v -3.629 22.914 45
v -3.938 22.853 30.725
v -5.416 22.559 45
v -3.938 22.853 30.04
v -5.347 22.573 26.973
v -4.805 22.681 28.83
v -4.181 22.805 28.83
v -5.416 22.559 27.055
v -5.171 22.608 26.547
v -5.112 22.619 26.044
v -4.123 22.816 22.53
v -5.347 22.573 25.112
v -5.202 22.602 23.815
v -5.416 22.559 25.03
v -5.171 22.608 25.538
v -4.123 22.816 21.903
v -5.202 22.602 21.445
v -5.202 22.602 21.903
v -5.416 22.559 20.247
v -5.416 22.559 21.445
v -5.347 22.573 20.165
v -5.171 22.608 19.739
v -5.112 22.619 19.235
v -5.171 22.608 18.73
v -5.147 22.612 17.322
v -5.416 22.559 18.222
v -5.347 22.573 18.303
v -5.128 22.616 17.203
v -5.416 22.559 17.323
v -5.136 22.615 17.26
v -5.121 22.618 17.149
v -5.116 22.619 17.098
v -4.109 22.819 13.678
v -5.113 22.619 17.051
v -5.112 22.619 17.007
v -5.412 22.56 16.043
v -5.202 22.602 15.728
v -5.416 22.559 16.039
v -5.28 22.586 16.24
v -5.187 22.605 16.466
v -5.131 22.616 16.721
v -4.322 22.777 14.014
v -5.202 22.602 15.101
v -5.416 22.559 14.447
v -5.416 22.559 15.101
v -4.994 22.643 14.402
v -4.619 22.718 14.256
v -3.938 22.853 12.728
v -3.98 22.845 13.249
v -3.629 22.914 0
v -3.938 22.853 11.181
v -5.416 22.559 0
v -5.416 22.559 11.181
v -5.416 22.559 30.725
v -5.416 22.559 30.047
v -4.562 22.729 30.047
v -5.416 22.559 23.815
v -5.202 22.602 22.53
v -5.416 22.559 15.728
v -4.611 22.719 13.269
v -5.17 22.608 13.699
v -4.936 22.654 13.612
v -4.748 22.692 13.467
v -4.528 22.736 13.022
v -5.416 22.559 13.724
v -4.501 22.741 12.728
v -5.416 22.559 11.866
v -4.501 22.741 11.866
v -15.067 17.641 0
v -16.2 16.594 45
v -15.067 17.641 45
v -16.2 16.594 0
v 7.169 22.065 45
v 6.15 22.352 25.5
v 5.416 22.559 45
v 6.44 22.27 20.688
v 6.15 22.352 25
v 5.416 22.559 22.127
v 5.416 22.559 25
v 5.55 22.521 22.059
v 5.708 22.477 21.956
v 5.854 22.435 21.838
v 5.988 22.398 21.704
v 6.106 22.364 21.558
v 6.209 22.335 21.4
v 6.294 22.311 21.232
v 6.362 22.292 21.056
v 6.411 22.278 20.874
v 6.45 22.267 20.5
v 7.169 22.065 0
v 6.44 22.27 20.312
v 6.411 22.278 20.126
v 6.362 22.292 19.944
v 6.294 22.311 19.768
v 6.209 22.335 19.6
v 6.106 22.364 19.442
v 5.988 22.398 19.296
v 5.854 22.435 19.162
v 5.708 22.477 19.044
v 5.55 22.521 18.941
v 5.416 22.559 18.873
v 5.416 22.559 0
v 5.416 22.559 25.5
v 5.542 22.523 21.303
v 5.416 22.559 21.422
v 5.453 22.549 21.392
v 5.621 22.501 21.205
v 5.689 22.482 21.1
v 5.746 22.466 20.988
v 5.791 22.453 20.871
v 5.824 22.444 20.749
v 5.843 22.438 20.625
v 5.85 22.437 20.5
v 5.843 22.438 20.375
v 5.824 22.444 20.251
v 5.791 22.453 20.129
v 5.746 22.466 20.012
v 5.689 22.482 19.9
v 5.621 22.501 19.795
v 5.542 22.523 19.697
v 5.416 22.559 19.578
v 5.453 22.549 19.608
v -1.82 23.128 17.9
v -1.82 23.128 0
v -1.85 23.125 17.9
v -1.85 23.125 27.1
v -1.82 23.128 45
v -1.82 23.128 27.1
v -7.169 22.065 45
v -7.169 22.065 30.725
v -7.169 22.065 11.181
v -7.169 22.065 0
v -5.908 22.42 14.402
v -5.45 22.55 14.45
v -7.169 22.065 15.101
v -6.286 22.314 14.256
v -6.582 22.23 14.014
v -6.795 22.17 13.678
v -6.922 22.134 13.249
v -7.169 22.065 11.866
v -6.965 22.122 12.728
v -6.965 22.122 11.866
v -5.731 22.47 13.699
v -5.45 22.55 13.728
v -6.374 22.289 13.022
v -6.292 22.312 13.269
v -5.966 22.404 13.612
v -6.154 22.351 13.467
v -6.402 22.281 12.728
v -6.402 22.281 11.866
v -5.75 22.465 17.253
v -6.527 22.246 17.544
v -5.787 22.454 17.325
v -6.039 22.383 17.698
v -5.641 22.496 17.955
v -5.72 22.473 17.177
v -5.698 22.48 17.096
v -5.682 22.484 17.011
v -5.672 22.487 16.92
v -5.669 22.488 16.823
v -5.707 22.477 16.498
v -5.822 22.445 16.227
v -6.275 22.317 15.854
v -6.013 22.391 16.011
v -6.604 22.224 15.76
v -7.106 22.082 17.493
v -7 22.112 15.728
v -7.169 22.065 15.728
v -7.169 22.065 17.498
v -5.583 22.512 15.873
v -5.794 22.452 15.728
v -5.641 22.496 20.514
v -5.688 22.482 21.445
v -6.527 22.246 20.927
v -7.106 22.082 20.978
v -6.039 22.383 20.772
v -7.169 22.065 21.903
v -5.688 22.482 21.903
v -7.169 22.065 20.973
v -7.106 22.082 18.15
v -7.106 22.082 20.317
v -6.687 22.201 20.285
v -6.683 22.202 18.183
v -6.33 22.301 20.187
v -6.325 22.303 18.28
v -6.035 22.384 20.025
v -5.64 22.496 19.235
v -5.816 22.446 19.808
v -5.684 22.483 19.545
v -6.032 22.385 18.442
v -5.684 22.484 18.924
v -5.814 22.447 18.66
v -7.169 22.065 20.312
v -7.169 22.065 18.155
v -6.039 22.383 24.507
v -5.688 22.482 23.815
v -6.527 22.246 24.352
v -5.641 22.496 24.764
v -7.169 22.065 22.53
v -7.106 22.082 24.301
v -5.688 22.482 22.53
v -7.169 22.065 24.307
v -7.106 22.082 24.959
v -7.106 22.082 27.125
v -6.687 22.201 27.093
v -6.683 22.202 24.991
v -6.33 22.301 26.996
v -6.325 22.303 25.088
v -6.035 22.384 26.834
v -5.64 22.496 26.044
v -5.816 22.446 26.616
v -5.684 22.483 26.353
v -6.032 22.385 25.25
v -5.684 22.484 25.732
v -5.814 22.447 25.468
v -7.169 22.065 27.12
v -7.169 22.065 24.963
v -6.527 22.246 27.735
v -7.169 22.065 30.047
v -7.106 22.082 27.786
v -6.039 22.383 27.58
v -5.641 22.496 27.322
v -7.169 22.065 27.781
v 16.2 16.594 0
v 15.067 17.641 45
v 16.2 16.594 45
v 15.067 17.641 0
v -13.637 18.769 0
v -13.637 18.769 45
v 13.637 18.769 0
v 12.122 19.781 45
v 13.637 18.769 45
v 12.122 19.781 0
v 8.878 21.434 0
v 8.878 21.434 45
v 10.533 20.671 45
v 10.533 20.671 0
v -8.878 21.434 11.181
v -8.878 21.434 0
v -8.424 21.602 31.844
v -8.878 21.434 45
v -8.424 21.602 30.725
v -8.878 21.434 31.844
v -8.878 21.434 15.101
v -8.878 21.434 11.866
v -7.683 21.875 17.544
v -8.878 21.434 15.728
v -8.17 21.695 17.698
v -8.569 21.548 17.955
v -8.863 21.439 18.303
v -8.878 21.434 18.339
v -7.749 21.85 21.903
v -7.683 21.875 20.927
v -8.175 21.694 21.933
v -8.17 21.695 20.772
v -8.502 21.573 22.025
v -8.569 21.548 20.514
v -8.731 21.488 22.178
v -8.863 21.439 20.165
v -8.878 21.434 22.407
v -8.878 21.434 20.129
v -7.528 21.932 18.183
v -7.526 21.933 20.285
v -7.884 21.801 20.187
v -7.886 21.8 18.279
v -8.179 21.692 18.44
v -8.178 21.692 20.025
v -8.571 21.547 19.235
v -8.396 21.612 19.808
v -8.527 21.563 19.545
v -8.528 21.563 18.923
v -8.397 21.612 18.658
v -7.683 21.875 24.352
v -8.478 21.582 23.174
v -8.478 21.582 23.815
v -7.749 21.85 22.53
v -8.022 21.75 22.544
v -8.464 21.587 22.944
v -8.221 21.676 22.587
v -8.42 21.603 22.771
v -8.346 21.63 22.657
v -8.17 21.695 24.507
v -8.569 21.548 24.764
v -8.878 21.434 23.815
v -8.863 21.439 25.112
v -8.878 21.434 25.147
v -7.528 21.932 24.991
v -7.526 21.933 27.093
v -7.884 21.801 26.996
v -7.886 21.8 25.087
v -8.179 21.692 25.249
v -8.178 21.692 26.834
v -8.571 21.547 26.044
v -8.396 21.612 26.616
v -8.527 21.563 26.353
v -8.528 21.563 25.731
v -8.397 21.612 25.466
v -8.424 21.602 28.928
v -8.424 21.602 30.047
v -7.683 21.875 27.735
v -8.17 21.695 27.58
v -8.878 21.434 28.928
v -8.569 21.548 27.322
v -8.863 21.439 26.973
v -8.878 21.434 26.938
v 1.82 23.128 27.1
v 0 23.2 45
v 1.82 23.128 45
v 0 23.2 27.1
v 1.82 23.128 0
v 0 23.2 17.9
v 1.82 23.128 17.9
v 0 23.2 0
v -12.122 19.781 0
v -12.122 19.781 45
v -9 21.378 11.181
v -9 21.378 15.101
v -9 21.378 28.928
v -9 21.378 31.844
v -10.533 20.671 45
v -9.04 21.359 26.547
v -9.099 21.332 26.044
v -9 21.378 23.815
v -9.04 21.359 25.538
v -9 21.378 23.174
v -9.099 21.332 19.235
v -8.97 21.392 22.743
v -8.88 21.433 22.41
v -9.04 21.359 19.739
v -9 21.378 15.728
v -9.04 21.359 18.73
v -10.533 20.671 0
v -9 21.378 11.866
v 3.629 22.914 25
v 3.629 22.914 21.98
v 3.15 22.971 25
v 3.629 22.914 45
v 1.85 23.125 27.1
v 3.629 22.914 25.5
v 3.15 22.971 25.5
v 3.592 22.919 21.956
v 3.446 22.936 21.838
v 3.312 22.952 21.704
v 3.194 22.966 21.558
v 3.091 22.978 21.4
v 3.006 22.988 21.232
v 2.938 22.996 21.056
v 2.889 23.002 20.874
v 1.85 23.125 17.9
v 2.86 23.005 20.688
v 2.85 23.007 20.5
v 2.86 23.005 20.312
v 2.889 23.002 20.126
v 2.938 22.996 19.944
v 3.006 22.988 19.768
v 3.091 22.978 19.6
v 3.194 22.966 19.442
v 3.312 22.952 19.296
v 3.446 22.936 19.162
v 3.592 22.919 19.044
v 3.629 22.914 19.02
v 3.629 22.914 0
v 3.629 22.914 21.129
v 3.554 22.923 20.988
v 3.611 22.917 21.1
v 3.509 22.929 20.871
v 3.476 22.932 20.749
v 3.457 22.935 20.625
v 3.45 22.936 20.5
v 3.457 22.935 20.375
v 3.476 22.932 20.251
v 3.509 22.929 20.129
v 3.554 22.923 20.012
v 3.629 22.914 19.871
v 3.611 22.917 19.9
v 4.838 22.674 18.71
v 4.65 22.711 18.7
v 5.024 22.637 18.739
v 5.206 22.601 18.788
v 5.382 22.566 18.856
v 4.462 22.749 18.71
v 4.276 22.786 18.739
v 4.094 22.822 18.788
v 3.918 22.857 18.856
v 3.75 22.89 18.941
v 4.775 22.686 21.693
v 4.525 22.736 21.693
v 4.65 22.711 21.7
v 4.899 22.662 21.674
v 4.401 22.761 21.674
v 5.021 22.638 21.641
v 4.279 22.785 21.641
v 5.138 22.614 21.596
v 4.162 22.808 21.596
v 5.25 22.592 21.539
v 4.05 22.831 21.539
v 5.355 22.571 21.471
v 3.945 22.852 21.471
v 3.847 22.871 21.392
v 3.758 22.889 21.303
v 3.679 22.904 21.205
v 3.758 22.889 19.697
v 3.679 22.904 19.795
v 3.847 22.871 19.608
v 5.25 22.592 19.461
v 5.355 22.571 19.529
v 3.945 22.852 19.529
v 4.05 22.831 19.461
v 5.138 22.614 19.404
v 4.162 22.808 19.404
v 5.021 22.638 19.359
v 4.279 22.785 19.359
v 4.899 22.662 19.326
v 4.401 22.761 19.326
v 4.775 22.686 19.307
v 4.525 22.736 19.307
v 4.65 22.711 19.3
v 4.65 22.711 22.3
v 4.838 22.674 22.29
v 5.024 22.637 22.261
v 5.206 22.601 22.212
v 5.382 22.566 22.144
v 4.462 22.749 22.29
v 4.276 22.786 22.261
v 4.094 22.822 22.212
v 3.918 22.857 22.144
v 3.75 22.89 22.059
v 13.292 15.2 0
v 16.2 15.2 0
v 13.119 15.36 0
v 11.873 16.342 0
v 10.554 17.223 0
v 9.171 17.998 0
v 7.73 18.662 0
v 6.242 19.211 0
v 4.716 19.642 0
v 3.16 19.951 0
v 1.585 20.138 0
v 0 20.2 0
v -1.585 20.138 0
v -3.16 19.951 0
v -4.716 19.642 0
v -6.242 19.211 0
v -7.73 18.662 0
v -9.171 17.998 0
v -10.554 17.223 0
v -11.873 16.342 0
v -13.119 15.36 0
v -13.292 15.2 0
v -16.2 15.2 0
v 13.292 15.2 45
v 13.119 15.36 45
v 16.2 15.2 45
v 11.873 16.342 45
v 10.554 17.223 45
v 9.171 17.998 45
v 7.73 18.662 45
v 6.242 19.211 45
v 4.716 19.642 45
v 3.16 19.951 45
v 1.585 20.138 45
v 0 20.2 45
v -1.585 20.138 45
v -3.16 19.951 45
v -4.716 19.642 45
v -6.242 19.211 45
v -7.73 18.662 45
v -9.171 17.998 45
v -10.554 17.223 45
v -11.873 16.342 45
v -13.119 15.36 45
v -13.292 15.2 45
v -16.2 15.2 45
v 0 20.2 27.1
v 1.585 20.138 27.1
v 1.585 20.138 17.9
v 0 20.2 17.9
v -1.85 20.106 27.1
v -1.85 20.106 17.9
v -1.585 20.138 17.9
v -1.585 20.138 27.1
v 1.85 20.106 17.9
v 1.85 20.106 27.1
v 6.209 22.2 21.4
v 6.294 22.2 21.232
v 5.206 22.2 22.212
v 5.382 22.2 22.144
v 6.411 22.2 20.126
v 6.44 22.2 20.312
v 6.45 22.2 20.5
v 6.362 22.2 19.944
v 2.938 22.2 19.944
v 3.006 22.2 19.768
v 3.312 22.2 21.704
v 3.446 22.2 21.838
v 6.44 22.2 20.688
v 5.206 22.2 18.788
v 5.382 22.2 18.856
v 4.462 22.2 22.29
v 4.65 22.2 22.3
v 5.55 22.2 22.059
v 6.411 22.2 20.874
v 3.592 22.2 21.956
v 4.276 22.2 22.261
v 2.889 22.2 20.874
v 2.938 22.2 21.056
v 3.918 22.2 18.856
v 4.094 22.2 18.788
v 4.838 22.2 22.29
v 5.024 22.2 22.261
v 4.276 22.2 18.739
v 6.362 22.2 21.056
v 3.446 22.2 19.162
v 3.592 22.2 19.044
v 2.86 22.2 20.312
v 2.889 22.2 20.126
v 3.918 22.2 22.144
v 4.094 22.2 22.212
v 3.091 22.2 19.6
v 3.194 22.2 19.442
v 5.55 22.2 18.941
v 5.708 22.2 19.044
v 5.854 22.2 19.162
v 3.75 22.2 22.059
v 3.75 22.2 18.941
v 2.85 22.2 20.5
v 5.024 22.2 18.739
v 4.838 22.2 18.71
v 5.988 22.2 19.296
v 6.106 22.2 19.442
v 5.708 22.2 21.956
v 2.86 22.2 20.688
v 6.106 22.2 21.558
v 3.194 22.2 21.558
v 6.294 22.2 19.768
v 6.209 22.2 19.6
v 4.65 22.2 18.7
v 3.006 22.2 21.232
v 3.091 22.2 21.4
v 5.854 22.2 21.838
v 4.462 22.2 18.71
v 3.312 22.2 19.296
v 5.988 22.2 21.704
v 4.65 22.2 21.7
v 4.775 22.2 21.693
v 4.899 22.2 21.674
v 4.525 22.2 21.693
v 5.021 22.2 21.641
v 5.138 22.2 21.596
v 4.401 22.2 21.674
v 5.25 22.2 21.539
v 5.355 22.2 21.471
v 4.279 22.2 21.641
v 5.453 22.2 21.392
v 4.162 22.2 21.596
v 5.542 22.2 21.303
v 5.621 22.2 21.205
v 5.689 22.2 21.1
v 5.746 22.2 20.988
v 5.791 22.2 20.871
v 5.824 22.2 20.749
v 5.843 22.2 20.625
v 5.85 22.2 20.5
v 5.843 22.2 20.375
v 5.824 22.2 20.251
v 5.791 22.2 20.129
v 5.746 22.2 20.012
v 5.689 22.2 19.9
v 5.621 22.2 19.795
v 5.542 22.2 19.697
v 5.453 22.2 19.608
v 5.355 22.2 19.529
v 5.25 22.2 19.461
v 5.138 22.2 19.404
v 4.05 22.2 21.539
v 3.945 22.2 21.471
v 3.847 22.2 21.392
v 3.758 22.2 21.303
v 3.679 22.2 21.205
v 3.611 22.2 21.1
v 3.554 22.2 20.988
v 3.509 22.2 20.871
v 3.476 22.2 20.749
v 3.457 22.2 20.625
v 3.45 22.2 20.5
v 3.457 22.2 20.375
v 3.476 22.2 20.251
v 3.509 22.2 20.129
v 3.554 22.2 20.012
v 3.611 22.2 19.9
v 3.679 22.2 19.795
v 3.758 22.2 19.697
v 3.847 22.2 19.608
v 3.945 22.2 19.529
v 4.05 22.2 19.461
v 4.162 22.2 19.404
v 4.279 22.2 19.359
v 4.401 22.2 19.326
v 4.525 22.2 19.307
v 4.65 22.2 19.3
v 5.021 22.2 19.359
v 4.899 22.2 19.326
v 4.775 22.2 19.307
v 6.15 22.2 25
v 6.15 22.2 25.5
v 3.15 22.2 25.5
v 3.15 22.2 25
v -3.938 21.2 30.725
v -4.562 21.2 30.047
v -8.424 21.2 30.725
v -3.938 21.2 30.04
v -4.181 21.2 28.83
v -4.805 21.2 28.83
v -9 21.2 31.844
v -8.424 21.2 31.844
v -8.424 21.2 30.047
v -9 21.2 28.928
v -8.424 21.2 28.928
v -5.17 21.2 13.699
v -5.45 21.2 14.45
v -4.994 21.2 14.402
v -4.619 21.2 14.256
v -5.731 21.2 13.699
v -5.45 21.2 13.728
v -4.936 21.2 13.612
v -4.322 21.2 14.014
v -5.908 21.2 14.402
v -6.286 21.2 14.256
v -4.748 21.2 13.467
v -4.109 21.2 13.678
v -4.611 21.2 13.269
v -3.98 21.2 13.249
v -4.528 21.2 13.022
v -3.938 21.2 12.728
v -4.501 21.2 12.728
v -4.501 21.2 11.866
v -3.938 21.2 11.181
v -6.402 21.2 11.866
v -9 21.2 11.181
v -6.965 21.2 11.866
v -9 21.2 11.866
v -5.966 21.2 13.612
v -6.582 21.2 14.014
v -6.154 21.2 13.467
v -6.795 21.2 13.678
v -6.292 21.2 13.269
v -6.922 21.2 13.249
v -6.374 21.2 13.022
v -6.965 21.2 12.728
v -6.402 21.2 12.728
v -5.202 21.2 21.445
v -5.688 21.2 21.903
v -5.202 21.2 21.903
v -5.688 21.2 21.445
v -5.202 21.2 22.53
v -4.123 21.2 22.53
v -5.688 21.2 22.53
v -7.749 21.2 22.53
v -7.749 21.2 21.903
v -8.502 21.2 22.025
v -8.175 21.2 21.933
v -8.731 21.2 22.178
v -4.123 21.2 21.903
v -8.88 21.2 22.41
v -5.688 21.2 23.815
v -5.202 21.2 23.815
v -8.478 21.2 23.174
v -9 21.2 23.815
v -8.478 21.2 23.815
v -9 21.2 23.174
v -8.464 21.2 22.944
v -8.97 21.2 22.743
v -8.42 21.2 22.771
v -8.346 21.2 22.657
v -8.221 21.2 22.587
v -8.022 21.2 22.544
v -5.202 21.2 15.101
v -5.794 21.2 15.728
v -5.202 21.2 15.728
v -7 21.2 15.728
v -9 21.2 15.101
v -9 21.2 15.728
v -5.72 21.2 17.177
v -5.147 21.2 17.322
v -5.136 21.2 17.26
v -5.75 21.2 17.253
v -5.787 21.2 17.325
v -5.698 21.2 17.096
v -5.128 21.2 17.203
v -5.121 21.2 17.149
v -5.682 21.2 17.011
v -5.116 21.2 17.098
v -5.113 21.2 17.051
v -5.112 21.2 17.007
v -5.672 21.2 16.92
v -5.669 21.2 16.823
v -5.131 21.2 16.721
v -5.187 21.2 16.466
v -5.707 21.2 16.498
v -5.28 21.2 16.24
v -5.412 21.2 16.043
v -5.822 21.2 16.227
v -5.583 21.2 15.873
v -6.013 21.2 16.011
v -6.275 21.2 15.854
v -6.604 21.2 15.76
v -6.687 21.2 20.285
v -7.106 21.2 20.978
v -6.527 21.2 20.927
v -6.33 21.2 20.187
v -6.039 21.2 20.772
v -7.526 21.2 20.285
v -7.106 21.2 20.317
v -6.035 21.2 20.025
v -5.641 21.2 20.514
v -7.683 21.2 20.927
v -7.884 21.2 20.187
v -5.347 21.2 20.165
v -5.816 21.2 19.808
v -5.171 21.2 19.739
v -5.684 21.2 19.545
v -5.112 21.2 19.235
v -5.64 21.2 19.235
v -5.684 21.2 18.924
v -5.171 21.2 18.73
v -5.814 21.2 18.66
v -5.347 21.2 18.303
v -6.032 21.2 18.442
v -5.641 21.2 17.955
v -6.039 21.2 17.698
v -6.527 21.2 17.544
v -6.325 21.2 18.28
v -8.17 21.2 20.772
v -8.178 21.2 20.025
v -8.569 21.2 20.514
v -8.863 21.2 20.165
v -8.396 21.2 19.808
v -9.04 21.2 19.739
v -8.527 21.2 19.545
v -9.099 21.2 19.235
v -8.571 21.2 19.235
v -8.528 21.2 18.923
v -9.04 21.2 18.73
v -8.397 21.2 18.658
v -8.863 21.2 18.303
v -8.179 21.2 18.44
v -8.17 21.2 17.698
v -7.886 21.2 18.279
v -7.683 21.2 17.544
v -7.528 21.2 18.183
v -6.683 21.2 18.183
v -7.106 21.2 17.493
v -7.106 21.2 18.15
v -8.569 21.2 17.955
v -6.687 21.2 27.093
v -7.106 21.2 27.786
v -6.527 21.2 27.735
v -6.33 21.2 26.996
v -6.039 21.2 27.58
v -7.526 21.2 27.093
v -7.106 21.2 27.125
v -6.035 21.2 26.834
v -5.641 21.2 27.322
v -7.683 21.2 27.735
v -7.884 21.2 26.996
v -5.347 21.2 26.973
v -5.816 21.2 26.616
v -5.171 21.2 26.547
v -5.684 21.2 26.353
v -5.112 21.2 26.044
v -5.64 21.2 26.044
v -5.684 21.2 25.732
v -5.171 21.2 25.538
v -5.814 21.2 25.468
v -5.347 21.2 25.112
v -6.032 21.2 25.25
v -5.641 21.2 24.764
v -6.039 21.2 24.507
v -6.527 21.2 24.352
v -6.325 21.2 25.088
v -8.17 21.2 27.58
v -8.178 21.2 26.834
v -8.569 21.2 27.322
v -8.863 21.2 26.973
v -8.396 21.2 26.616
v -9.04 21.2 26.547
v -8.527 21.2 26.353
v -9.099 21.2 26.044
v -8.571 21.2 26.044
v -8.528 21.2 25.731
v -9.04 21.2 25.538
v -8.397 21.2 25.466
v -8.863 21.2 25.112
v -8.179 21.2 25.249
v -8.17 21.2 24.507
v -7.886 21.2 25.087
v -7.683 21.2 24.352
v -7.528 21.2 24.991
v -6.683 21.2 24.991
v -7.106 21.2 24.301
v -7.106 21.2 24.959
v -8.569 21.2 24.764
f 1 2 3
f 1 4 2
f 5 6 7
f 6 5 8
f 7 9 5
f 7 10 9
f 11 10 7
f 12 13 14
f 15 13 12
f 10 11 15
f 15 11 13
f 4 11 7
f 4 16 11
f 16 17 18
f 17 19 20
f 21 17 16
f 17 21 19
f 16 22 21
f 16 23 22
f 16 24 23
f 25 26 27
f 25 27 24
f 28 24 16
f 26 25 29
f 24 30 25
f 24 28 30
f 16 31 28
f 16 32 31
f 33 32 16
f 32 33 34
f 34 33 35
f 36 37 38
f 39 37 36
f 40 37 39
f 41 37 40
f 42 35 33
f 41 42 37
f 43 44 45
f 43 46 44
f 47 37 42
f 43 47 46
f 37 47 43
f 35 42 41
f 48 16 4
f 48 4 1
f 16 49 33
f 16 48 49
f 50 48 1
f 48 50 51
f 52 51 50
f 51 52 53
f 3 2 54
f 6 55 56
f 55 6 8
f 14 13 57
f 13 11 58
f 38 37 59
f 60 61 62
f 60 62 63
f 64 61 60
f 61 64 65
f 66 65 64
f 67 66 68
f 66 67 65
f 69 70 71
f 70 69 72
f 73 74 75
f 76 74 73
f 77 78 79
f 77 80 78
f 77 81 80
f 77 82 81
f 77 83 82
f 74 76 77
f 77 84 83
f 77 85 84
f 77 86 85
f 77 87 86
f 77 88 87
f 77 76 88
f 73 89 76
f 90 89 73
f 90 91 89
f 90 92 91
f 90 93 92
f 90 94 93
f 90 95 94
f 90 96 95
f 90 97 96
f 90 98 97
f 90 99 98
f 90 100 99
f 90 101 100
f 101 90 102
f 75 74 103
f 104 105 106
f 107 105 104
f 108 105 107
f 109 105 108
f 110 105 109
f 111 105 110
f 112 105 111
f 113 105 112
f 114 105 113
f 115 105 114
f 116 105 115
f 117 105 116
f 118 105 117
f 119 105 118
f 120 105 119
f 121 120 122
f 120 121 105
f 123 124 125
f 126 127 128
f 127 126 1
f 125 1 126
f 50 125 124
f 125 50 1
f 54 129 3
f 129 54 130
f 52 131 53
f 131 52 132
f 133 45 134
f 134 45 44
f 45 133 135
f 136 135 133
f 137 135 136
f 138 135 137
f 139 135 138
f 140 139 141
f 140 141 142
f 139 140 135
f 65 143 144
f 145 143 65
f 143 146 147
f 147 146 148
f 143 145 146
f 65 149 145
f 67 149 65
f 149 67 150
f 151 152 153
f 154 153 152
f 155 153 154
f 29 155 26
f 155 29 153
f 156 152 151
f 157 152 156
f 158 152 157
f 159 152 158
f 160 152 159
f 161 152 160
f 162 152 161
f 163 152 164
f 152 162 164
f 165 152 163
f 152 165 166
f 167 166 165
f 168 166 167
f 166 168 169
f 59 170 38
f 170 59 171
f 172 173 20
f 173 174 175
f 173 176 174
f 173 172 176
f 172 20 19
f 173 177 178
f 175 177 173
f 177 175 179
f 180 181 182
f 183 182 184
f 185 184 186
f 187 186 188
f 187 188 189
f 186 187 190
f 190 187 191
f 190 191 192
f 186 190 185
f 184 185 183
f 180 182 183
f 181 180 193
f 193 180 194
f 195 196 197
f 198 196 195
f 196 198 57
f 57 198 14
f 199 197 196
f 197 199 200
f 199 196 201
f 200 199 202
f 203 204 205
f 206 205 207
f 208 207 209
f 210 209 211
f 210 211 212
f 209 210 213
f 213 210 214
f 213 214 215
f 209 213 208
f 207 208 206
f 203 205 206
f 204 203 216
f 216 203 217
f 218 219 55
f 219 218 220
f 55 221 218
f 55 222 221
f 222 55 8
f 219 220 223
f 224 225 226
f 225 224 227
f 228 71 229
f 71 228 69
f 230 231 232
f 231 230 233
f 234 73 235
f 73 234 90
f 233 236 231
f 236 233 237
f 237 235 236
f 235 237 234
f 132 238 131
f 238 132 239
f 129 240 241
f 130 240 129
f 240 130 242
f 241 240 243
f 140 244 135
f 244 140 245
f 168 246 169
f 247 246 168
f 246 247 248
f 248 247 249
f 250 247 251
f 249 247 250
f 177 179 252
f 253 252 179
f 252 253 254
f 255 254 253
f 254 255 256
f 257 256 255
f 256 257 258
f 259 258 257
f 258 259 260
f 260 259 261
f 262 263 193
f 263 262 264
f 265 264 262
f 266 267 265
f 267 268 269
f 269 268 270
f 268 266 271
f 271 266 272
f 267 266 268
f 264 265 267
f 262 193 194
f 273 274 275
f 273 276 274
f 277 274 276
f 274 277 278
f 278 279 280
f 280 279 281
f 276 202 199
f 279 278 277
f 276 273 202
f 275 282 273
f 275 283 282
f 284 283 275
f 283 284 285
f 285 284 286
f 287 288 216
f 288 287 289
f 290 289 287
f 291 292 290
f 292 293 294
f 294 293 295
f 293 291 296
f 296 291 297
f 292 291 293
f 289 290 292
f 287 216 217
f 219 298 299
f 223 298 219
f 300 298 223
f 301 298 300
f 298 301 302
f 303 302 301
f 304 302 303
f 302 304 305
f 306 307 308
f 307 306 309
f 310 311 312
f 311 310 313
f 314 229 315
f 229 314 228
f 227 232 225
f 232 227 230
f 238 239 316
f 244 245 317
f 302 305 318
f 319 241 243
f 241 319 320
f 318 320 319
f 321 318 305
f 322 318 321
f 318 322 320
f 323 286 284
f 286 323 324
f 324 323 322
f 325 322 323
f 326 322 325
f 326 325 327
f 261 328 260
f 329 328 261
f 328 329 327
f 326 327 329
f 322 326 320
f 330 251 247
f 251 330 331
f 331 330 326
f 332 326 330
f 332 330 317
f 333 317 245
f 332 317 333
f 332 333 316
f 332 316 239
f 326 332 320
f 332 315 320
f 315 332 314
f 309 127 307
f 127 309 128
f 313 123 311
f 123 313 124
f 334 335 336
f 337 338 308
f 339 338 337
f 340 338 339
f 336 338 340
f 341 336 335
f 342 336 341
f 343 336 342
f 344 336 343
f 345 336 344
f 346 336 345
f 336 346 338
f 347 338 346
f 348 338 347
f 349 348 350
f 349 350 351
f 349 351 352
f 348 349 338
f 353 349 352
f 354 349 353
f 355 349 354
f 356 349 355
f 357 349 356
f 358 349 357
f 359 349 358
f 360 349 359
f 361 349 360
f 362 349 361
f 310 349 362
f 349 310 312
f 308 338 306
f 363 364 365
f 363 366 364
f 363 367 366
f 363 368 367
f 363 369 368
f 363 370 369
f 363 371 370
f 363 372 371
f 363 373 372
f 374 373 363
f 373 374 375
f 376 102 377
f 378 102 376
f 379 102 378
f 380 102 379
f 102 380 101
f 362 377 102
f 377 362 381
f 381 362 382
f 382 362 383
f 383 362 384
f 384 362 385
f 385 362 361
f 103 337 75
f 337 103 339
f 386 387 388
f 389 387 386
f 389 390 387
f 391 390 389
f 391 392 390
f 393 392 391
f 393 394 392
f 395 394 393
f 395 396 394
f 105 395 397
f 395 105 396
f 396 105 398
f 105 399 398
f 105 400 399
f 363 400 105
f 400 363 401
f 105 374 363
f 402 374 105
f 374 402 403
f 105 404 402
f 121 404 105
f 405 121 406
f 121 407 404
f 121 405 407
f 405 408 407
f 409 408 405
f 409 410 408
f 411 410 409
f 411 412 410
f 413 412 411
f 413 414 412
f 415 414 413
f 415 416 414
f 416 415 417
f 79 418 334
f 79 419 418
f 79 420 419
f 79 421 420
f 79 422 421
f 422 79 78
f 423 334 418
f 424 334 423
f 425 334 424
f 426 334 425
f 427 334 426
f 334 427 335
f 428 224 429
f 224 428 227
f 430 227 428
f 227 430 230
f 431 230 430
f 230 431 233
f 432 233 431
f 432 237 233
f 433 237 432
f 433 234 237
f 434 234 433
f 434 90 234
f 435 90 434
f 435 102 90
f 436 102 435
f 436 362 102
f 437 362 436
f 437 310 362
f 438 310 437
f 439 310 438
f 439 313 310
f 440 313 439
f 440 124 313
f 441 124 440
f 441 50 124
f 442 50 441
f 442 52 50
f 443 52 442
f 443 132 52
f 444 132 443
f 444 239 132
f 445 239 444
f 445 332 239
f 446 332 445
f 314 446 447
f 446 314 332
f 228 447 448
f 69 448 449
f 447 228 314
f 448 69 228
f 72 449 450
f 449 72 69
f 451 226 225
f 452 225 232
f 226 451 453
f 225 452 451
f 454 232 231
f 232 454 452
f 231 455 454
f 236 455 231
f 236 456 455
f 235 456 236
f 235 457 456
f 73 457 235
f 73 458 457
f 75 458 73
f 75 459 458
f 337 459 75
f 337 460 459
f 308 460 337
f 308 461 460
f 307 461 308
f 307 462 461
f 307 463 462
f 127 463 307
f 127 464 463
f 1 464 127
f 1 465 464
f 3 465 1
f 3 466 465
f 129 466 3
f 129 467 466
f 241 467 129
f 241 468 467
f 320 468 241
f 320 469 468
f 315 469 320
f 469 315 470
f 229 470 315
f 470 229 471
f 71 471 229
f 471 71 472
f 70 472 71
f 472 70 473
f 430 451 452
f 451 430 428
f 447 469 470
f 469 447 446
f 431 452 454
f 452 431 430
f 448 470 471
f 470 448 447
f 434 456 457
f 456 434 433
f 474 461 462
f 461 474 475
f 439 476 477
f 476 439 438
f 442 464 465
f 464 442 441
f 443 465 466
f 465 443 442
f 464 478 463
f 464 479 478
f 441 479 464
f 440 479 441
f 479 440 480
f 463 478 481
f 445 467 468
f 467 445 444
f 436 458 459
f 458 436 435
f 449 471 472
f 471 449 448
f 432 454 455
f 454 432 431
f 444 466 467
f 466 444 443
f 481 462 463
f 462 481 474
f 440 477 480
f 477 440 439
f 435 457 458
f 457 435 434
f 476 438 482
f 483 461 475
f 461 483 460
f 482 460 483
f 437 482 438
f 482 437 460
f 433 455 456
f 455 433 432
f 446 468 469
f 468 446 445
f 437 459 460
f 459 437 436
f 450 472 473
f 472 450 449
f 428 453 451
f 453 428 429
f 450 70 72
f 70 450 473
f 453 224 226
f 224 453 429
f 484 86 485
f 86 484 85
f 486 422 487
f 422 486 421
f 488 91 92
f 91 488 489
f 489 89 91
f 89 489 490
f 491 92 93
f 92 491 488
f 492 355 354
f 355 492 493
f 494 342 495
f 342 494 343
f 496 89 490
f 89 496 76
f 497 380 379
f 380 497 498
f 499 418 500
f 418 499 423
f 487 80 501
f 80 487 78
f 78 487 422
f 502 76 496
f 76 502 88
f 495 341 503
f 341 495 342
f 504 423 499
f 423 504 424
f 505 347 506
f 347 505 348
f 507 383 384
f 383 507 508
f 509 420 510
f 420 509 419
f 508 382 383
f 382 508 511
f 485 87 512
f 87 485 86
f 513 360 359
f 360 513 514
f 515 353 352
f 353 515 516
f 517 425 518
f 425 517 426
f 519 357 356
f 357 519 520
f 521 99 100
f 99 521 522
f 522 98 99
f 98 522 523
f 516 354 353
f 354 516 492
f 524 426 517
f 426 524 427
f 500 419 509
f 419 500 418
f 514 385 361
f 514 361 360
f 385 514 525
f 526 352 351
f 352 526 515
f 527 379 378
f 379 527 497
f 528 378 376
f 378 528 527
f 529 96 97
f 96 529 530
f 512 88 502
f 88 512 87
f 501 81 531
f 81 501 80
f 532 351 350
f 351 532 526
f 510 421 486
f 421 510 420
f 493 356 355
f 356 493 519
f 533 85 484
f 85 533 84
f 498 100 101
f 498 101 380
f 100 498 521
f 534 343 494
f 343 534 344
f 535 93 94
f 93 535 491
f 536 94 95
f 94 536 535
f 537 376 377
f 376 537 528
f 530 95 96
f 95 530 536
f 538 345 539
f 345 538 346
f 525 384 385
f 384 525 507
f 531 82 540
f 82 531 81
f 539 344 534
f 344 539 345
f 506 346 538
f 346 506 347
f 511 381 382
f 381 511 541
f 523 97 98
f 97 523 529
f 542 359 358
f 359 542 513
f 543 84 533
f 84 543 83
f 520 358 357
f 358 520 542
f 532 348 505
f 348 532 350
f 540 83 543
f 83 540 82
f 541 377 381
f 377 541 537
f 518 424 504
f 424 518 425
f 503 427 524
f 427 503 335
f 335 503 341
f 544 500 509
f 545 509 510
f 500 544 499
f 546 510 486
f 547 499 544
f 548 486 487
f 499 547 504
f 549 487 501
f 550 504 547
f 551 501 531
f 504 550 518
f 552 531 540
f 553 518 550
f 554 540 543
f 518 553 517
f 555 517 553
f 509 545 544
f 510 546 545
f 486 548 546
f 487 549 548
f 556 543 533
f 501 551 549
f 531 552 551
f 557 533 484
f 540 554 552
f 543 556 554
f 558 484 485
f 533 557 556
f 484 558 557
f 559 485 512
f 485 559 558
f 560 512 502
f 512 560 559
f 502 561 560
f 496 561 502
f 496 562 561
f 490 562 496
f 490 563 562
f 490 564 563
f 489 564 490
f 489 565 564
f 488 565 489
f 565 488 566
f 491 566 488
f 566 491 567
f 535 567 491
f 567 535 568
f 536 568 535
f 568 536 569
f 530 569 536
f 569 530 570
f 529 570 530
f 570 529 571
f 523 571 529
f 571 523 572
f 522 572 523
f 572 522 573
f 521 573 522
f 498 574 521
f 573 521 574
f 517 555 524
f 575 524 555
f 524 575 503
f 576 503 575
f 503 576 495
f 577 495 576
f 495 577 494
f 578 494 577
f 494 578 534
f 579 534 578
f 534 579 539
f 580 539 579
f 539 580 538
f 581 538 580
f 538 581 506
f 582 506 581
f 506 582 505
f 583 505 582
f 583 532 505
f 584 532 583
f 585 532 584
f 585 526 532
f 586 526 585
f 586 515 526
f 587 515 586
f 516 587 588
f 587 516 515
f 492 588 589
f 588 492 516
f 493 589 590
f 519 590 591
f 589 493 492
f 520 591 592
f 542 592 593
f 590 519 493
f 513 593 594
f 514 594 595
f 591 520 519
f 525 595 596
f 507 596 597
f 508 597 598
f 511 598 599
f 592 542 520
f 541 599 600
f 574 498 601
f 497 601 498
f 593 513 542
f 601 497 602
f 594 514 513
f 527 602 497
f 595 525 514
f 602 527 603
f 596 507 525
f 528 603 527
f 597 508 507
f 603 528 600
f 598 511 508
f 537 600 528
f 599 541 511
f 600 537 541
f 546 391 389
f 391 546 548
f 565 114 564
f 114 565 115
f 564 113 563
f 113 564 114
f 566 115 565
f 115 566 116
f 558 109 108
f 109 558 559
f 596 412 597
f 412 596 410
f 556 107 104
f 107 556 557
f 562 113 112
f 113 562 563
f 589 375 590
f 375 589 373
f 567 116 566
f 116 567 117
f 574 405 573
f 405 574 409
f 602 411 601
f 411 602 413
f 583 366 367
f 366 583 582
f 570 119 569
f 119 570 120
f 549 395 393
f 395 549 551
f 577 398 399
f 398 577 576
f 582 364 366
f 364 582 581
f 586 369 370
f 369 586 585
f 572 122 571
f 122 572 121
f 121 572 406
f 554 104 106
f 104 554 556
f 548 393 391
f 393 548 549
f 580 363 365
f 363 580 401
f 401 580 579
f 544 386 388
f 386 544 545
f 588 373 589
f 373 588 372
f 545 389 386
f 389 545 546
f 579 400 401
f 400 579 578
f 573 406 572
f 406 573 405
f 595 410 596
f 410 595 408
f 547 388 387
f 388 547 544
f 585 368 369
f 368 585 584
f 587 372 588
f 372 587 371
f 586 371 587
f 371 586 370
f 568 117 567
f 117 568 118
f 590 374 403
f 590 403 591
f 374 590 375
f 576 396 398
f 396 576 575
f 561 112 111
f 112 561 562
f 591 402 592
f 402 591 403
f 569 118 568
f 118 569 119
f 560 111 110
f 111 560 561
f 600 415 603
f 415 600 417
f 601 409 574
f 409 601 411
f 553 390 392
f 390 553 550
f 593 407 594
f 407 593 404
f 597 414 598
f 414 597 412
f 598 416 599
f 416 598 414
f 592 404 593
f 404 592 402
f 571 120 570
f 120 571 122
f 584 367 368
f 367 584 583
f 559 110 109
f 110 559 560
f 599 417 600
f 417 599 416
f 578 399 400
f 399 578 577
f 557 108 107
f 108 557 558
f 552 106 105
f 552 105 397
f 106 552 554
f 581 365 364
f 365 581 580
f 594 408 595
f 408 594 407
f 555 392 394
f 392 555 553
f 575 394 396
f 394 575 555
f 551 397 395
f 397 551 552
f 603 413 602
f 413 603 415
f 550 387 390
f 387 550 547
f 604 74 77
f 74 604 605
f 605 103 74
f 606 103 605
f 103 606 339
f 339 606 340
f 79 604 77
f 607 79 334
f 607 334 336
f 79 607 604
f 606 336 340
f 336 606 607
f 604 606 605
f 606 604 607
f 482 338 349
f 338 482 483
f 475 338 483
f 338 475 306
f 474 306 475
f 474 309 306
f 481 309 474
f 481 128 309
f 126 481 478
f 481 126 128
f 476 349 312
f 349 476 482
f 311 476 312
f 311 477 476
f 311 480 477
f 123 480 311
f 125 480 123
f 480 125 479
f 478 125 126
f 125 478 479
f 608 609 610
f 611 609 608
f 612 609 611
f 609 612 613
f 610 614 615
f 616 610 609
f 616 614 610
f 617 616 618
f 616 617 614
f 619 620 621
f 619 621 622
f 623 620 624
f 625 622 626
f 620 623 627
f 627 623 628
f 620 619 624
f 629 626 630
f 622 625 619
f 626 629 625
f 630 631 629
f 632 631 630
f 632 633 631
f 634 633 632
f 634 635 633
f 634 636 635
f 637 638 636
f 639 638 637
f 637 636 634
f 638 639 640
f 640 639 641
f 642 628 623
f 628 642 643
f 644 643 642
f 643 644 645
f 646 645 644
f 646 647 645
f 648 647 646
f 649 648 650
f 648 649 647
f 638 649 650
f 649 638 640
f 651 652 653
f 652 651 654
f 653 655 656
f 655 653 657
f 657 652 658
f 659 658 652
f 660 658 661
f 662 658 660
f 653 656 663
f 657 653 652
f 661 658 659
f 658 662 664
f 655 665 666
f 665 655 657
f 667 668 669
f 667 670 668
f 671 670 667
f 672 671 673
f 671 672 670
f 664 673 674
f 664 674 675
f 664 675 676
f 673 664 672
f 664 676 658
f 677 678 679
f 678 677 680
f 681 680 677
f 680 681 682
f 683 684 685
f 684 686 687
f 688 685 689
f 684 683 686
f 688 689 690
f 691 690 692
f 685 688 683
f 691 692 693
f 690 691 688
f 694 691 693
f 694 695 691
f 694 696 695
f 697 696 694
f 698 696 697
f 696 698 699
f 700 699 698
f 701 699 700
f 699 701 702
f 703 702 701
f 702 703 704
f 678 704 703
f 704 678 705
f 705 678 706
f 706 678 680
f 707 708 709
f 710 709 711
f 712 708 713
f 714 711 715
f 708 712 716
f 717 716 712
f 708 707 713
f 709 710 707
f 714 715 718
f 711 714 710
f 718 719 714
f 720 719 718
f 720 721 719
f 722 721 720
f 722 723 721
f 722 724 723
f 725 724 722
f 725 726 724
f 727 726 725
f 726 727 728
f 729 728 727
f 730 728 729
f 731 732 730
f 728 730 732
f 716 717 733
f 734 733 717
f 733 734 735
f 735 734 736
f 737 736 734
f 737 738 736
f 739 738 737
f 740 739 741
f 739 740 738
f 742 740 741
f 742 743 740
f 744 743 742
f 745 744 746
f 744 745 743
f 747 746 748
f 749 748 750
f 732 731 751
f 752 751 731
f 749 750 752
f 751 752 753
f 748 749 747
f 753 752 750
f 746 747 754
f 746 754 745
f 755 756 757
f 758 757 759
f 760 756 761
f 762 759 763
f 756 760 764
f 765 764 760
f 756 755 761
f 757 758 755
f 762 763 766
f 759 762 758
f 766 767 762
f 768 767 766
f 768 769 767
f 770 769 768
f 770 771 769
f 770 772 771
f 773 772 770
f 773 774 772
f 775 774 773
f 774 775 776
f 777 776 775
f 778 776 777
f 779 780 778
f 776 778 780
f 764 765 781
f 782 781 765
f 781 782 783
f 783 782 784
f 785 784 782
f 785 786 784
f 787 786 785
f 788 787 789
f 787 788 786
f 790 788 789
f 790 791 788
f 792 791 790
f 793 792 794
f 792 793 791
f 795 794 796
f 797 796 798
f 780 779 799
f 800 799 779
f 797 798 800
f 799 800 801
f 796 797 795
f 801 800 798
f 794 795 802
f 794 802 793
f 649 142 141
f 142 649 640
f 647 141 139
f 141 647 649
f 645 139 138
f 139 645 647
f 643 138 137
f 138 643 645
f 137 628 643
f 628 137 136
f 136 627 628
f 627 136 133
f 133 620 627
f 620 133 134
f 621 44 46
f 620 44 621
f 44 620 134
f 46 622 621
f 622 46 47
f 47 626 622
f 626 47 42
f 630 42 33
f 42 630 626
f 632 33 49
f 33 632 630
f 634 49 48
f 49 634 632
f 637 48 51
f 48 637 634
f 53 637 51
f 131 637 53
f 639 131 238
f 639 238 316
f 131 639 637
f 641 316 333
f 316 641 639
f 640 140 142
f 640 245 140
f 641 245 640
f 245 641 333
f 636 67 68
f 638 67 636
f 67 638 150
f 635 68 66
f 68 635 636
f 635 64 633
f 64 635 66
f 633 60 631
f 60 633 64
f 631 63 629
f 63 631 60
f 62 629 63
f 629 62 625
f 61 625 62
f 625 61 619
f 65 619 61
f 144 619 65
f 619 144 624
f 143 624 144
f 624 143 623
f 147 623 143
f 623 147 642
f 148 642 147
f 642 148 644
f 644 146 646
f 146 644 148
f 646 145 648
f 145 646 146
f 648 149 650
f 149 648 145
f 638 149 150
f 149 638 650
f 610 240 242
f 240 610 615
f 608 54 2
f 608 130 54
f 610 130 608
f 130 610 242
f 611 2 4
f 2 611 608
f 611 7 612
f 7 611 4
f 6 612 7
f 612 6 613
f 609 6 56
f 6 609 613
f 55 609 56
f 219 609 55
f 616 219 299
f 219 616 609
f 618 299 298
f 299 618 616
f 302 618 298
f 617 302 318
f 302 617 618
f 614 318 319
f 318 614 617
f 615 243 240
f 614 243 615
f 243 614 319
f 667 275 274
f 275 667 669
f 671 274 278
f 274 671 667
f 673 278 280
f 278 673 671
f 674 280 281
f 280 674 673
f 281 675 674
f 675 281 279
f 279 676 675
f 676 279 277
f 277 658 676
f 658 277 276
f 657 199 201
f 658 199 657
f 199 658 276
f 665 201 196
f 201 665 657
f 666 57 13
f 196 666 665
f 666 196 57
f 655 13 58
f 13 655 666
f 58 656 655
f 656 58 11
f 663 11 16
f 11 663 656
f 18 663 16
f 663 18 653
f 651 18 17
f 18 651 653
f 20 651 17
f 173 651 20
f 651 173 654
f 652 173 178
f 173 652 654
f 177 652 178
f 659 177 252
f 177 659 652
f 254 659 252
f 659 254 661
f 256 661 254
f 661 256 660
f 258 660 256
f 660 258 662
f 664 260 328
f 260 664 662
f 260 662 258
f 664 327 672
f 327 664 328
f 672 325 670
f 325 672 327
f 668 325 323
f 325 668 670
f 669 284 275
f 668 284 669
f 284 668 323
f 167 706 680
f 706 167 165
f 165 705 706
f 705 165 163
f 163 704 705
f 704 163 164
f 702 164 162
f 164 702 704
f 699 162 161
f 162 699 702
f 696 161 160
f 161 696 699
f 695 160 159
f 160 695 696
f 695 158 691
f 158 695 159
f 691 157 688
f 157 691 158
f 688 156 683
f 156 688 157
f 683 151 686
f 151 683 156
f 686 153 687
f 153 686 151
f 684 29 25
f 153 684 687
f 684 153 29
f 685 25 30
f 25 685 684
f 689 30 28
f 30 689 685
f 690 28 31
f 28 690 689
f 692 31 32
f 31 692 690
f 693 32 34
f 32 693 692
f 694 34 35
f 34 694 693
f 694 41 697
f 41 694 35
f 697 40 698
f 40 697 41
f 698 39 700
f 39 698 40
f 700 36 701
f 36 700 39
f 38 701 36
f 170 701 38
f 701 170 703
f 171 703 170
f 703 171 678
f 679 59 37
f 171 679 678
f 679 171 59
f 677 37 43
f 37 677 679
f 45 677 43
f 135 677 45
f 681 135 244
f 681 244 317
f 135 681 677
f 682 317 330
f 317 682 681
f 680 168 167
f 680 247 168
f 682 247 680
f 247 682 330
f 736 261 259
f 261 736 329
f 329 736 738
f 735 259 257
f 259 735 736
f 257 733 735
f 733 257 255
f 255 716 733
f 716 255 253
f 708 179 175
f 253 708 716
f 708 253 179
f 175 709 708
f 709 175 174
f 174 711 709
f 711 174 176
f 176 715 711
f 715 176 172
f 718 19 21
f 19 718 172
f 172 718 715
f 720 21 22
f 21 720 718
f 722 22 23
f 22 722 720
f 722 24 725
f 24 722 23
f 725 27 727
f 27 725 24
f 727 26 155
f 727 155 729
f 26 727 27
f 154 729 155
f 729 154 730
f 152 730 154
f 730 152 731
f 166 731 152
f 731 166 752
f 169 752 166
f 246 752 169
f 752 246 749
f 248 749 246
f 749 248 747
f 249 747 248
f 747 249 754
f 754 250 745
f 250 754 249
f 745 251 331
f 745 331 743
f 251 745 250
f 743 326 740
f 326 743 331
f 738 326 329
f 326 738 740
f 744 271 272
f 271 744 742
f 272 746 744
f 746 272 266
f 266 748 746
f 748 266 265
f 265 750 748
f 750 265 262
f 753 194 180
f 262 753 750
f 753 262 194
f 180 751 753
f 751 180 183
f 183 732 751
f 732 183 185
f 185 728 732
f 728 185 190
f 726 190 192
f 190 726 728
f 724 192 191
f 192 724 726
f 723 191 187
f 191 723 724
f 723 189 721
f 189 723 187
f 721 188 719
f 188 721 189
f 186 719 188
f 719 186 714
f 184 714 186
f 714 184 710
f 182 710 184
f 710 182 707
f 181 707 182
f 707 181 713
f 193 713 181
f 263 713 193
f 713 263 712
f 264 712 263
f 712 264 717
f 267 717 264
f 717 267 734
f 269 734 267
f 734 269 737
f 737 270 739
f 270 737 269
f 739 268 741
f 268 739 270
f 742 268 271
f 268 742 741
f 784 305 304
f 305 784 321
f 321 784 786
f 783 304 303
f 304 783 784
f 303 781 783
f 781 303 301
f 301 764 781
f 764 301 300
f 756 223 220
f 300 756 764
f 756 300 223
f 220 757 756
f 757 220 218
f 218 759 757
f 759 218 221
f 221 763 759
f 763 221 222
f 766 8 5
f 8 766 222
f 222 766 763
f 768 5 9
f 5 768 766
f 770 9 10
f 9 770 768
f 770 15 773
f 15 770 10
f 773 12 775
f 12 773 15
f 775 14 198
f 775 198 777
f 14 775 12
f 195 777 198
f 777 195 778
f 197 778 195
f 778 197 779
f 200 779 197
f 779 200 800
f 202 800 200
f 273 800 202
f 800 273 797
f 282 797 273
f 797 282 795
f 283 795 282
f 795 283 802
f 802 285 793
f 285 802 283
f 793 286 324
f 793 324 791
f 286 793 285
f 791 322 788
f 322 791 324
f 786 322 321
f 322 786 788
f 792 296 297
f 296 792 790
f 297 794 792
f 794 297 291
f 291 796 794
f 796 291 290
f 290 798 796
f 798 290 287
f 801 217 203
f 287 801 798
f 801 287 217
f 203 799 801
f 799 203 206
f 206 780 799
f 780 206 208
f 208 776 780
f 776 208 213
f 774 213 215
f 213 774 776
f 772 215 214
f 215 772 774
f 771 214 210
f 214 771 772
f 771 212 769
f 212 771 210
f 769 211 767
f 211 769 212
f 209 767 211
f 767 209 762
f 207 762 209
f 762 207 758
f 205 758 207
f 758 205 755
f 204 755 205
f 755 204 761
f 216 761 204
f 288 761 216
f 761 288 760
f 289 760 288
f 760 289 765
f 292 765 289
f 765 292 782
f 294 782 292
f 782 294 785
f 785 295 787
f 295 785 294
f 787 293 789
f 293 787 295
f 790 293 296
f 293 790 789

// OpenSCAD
// file: variables.scad
// General

resolution = 80;
delta = 0.2;

// dimensions tubes pvc

rayon_ext_tube_32 = 16;
rayon_int_tube_32 = 13;
epaisseur_tube_32 = rayon_ext_tube_32 - rayon_int_tube_32;

rayon_ext_tube_40 = 20;
rayon_int_tube_40 = 17.5;
epaisseur_tube_40 = rayon_ext_tube_40 - rayon_int_tube_40;

ret32 = rayon_ext_tube_32;
rit32 = rayon_int_tube_32;
ep32  = epaisseur_tube_32;
ret40 = rayon_ext_tube_40;
rit40 = rayon_int_tube_40;
ep40  = epaisseur_tube_40;

// Reducteur

epaisseur_reducteur = 4;

// L'embout accueille un tube pvc de 40mm de diamètre.

hauteur_embout = 20;
rayon_int_embout = rayon_ext_tube_40 + delta;
rayon_ext_embout = 24 + delta;

hauteur_butee = 2;
rayon_int_butee = 16;

// Jonction: section de contact entre les deux pièces.
hauteur_grower = 10.5;

rayon_ext_culot = rayon_ext_tube_40 - delta;
rayon_int_culot = 18 - delta;
hauteur_jonction = 30;

hauteur_totale = hauteur_jonction + hauteur_embout + hauteur_butee + hauteur_grower;

profondeur_douille = 12;

largeur_empreinte = 6;

position_z_empreinte = hauteur_totale - profondeur_douille + 1;

nb_baionette = 3;
rayon_baionette = largeur_empreinte / 2;
baionette_z = hauteur_totale - (hauteur_jonction - profondeur_douille);
// file: common.scad
module tube(hauteur, rayon_exterieur, rayon_interieur, resolution=resolution) {
	difference(){
	  cylinder(hauteur, rayon_exterieur, rayon_exterieur, $fn=resolution);
	  translate([0,0,-1])	
	 	  cylinder(hauteur + 2 , rayon_interieur, rayon_interieur, $fn=resolution);
	}
}

module donut(rayon_spheres, rayon_exterieur){
	rotate_extrude(convexity = 10, $fn = resolution)
		translate([rayon_exterieur,0,0])
		circle(r = rayon_spheres, $fn = resolution);
}
// main file
include <common.scad>;
include <variables.scad>;

// epaisseur =
rayon_ext = rayon_ext_embout - 1;
decalageY = rayon_ext + 10;
epaisseur = rayon_ext - rayon_int_embout;

hauteur_plaque = 45;

largeur_switch = 3.7;
hauteur_switch = 9.2;

nom_tonfa = "Proto1";

difference() {
	plaque();
	empreinte_switch();
	signes_on_off();
	texte();
}

module empreinte_switch() {
	translate([-largeur_switch/2, 0, hauteur_plaque/2 - hauteur_switch/2])
		cube([largeur_switch,rayon_ext+1,hauteur_switch]);
}

module signes_on_off() {

	hauteur_signes = 5;

	translate([2,rayon_ext-1,0]) {
		translate([-largeur_switch/2+3, 0, hauteur_plaque/2+2.5])
			cube([3,hauteur_signes,0.5]);
		translate([-largeur_switch/2+4.5, 0, hauteur_plaque/2-2])
			rotate([-90,0,0])
			  tube(hauteur_signes,1.8,1.2, $fn = resolution);
	}

}

module texte() {
	translate([-9,rayon_ext-2,(hauteur_plaque/2)-12]) {
		rotate([0,-90,-90]) {
			linear_extrude(height = 10)
				text(nom_tonfa, font="Courier 10 Pitch", size = 5);
		}
	}
}

module plaque() {
	difference () {
		tube(hauteur_plaque, rayon_ext, rayon_int_embout, resolution);
		translate([-rayon_ext-2,-decalageY,-10])
			#cube([rayon_ext_embout*2, rayon_ext_embout*2,hauteur_plaque*1.5]);
		translate([-rayon_ext+1,decalageY-20,-10])
			#cube([epaisseur*2, epaisseur*2,hauteur_plaque*1.5]);
		translate([rayon_ext-7,decalageY-20,-10])
			#cube([epaisseur*2, epaisseur*2,hauteur_plaque*1.5]);
	}
}
